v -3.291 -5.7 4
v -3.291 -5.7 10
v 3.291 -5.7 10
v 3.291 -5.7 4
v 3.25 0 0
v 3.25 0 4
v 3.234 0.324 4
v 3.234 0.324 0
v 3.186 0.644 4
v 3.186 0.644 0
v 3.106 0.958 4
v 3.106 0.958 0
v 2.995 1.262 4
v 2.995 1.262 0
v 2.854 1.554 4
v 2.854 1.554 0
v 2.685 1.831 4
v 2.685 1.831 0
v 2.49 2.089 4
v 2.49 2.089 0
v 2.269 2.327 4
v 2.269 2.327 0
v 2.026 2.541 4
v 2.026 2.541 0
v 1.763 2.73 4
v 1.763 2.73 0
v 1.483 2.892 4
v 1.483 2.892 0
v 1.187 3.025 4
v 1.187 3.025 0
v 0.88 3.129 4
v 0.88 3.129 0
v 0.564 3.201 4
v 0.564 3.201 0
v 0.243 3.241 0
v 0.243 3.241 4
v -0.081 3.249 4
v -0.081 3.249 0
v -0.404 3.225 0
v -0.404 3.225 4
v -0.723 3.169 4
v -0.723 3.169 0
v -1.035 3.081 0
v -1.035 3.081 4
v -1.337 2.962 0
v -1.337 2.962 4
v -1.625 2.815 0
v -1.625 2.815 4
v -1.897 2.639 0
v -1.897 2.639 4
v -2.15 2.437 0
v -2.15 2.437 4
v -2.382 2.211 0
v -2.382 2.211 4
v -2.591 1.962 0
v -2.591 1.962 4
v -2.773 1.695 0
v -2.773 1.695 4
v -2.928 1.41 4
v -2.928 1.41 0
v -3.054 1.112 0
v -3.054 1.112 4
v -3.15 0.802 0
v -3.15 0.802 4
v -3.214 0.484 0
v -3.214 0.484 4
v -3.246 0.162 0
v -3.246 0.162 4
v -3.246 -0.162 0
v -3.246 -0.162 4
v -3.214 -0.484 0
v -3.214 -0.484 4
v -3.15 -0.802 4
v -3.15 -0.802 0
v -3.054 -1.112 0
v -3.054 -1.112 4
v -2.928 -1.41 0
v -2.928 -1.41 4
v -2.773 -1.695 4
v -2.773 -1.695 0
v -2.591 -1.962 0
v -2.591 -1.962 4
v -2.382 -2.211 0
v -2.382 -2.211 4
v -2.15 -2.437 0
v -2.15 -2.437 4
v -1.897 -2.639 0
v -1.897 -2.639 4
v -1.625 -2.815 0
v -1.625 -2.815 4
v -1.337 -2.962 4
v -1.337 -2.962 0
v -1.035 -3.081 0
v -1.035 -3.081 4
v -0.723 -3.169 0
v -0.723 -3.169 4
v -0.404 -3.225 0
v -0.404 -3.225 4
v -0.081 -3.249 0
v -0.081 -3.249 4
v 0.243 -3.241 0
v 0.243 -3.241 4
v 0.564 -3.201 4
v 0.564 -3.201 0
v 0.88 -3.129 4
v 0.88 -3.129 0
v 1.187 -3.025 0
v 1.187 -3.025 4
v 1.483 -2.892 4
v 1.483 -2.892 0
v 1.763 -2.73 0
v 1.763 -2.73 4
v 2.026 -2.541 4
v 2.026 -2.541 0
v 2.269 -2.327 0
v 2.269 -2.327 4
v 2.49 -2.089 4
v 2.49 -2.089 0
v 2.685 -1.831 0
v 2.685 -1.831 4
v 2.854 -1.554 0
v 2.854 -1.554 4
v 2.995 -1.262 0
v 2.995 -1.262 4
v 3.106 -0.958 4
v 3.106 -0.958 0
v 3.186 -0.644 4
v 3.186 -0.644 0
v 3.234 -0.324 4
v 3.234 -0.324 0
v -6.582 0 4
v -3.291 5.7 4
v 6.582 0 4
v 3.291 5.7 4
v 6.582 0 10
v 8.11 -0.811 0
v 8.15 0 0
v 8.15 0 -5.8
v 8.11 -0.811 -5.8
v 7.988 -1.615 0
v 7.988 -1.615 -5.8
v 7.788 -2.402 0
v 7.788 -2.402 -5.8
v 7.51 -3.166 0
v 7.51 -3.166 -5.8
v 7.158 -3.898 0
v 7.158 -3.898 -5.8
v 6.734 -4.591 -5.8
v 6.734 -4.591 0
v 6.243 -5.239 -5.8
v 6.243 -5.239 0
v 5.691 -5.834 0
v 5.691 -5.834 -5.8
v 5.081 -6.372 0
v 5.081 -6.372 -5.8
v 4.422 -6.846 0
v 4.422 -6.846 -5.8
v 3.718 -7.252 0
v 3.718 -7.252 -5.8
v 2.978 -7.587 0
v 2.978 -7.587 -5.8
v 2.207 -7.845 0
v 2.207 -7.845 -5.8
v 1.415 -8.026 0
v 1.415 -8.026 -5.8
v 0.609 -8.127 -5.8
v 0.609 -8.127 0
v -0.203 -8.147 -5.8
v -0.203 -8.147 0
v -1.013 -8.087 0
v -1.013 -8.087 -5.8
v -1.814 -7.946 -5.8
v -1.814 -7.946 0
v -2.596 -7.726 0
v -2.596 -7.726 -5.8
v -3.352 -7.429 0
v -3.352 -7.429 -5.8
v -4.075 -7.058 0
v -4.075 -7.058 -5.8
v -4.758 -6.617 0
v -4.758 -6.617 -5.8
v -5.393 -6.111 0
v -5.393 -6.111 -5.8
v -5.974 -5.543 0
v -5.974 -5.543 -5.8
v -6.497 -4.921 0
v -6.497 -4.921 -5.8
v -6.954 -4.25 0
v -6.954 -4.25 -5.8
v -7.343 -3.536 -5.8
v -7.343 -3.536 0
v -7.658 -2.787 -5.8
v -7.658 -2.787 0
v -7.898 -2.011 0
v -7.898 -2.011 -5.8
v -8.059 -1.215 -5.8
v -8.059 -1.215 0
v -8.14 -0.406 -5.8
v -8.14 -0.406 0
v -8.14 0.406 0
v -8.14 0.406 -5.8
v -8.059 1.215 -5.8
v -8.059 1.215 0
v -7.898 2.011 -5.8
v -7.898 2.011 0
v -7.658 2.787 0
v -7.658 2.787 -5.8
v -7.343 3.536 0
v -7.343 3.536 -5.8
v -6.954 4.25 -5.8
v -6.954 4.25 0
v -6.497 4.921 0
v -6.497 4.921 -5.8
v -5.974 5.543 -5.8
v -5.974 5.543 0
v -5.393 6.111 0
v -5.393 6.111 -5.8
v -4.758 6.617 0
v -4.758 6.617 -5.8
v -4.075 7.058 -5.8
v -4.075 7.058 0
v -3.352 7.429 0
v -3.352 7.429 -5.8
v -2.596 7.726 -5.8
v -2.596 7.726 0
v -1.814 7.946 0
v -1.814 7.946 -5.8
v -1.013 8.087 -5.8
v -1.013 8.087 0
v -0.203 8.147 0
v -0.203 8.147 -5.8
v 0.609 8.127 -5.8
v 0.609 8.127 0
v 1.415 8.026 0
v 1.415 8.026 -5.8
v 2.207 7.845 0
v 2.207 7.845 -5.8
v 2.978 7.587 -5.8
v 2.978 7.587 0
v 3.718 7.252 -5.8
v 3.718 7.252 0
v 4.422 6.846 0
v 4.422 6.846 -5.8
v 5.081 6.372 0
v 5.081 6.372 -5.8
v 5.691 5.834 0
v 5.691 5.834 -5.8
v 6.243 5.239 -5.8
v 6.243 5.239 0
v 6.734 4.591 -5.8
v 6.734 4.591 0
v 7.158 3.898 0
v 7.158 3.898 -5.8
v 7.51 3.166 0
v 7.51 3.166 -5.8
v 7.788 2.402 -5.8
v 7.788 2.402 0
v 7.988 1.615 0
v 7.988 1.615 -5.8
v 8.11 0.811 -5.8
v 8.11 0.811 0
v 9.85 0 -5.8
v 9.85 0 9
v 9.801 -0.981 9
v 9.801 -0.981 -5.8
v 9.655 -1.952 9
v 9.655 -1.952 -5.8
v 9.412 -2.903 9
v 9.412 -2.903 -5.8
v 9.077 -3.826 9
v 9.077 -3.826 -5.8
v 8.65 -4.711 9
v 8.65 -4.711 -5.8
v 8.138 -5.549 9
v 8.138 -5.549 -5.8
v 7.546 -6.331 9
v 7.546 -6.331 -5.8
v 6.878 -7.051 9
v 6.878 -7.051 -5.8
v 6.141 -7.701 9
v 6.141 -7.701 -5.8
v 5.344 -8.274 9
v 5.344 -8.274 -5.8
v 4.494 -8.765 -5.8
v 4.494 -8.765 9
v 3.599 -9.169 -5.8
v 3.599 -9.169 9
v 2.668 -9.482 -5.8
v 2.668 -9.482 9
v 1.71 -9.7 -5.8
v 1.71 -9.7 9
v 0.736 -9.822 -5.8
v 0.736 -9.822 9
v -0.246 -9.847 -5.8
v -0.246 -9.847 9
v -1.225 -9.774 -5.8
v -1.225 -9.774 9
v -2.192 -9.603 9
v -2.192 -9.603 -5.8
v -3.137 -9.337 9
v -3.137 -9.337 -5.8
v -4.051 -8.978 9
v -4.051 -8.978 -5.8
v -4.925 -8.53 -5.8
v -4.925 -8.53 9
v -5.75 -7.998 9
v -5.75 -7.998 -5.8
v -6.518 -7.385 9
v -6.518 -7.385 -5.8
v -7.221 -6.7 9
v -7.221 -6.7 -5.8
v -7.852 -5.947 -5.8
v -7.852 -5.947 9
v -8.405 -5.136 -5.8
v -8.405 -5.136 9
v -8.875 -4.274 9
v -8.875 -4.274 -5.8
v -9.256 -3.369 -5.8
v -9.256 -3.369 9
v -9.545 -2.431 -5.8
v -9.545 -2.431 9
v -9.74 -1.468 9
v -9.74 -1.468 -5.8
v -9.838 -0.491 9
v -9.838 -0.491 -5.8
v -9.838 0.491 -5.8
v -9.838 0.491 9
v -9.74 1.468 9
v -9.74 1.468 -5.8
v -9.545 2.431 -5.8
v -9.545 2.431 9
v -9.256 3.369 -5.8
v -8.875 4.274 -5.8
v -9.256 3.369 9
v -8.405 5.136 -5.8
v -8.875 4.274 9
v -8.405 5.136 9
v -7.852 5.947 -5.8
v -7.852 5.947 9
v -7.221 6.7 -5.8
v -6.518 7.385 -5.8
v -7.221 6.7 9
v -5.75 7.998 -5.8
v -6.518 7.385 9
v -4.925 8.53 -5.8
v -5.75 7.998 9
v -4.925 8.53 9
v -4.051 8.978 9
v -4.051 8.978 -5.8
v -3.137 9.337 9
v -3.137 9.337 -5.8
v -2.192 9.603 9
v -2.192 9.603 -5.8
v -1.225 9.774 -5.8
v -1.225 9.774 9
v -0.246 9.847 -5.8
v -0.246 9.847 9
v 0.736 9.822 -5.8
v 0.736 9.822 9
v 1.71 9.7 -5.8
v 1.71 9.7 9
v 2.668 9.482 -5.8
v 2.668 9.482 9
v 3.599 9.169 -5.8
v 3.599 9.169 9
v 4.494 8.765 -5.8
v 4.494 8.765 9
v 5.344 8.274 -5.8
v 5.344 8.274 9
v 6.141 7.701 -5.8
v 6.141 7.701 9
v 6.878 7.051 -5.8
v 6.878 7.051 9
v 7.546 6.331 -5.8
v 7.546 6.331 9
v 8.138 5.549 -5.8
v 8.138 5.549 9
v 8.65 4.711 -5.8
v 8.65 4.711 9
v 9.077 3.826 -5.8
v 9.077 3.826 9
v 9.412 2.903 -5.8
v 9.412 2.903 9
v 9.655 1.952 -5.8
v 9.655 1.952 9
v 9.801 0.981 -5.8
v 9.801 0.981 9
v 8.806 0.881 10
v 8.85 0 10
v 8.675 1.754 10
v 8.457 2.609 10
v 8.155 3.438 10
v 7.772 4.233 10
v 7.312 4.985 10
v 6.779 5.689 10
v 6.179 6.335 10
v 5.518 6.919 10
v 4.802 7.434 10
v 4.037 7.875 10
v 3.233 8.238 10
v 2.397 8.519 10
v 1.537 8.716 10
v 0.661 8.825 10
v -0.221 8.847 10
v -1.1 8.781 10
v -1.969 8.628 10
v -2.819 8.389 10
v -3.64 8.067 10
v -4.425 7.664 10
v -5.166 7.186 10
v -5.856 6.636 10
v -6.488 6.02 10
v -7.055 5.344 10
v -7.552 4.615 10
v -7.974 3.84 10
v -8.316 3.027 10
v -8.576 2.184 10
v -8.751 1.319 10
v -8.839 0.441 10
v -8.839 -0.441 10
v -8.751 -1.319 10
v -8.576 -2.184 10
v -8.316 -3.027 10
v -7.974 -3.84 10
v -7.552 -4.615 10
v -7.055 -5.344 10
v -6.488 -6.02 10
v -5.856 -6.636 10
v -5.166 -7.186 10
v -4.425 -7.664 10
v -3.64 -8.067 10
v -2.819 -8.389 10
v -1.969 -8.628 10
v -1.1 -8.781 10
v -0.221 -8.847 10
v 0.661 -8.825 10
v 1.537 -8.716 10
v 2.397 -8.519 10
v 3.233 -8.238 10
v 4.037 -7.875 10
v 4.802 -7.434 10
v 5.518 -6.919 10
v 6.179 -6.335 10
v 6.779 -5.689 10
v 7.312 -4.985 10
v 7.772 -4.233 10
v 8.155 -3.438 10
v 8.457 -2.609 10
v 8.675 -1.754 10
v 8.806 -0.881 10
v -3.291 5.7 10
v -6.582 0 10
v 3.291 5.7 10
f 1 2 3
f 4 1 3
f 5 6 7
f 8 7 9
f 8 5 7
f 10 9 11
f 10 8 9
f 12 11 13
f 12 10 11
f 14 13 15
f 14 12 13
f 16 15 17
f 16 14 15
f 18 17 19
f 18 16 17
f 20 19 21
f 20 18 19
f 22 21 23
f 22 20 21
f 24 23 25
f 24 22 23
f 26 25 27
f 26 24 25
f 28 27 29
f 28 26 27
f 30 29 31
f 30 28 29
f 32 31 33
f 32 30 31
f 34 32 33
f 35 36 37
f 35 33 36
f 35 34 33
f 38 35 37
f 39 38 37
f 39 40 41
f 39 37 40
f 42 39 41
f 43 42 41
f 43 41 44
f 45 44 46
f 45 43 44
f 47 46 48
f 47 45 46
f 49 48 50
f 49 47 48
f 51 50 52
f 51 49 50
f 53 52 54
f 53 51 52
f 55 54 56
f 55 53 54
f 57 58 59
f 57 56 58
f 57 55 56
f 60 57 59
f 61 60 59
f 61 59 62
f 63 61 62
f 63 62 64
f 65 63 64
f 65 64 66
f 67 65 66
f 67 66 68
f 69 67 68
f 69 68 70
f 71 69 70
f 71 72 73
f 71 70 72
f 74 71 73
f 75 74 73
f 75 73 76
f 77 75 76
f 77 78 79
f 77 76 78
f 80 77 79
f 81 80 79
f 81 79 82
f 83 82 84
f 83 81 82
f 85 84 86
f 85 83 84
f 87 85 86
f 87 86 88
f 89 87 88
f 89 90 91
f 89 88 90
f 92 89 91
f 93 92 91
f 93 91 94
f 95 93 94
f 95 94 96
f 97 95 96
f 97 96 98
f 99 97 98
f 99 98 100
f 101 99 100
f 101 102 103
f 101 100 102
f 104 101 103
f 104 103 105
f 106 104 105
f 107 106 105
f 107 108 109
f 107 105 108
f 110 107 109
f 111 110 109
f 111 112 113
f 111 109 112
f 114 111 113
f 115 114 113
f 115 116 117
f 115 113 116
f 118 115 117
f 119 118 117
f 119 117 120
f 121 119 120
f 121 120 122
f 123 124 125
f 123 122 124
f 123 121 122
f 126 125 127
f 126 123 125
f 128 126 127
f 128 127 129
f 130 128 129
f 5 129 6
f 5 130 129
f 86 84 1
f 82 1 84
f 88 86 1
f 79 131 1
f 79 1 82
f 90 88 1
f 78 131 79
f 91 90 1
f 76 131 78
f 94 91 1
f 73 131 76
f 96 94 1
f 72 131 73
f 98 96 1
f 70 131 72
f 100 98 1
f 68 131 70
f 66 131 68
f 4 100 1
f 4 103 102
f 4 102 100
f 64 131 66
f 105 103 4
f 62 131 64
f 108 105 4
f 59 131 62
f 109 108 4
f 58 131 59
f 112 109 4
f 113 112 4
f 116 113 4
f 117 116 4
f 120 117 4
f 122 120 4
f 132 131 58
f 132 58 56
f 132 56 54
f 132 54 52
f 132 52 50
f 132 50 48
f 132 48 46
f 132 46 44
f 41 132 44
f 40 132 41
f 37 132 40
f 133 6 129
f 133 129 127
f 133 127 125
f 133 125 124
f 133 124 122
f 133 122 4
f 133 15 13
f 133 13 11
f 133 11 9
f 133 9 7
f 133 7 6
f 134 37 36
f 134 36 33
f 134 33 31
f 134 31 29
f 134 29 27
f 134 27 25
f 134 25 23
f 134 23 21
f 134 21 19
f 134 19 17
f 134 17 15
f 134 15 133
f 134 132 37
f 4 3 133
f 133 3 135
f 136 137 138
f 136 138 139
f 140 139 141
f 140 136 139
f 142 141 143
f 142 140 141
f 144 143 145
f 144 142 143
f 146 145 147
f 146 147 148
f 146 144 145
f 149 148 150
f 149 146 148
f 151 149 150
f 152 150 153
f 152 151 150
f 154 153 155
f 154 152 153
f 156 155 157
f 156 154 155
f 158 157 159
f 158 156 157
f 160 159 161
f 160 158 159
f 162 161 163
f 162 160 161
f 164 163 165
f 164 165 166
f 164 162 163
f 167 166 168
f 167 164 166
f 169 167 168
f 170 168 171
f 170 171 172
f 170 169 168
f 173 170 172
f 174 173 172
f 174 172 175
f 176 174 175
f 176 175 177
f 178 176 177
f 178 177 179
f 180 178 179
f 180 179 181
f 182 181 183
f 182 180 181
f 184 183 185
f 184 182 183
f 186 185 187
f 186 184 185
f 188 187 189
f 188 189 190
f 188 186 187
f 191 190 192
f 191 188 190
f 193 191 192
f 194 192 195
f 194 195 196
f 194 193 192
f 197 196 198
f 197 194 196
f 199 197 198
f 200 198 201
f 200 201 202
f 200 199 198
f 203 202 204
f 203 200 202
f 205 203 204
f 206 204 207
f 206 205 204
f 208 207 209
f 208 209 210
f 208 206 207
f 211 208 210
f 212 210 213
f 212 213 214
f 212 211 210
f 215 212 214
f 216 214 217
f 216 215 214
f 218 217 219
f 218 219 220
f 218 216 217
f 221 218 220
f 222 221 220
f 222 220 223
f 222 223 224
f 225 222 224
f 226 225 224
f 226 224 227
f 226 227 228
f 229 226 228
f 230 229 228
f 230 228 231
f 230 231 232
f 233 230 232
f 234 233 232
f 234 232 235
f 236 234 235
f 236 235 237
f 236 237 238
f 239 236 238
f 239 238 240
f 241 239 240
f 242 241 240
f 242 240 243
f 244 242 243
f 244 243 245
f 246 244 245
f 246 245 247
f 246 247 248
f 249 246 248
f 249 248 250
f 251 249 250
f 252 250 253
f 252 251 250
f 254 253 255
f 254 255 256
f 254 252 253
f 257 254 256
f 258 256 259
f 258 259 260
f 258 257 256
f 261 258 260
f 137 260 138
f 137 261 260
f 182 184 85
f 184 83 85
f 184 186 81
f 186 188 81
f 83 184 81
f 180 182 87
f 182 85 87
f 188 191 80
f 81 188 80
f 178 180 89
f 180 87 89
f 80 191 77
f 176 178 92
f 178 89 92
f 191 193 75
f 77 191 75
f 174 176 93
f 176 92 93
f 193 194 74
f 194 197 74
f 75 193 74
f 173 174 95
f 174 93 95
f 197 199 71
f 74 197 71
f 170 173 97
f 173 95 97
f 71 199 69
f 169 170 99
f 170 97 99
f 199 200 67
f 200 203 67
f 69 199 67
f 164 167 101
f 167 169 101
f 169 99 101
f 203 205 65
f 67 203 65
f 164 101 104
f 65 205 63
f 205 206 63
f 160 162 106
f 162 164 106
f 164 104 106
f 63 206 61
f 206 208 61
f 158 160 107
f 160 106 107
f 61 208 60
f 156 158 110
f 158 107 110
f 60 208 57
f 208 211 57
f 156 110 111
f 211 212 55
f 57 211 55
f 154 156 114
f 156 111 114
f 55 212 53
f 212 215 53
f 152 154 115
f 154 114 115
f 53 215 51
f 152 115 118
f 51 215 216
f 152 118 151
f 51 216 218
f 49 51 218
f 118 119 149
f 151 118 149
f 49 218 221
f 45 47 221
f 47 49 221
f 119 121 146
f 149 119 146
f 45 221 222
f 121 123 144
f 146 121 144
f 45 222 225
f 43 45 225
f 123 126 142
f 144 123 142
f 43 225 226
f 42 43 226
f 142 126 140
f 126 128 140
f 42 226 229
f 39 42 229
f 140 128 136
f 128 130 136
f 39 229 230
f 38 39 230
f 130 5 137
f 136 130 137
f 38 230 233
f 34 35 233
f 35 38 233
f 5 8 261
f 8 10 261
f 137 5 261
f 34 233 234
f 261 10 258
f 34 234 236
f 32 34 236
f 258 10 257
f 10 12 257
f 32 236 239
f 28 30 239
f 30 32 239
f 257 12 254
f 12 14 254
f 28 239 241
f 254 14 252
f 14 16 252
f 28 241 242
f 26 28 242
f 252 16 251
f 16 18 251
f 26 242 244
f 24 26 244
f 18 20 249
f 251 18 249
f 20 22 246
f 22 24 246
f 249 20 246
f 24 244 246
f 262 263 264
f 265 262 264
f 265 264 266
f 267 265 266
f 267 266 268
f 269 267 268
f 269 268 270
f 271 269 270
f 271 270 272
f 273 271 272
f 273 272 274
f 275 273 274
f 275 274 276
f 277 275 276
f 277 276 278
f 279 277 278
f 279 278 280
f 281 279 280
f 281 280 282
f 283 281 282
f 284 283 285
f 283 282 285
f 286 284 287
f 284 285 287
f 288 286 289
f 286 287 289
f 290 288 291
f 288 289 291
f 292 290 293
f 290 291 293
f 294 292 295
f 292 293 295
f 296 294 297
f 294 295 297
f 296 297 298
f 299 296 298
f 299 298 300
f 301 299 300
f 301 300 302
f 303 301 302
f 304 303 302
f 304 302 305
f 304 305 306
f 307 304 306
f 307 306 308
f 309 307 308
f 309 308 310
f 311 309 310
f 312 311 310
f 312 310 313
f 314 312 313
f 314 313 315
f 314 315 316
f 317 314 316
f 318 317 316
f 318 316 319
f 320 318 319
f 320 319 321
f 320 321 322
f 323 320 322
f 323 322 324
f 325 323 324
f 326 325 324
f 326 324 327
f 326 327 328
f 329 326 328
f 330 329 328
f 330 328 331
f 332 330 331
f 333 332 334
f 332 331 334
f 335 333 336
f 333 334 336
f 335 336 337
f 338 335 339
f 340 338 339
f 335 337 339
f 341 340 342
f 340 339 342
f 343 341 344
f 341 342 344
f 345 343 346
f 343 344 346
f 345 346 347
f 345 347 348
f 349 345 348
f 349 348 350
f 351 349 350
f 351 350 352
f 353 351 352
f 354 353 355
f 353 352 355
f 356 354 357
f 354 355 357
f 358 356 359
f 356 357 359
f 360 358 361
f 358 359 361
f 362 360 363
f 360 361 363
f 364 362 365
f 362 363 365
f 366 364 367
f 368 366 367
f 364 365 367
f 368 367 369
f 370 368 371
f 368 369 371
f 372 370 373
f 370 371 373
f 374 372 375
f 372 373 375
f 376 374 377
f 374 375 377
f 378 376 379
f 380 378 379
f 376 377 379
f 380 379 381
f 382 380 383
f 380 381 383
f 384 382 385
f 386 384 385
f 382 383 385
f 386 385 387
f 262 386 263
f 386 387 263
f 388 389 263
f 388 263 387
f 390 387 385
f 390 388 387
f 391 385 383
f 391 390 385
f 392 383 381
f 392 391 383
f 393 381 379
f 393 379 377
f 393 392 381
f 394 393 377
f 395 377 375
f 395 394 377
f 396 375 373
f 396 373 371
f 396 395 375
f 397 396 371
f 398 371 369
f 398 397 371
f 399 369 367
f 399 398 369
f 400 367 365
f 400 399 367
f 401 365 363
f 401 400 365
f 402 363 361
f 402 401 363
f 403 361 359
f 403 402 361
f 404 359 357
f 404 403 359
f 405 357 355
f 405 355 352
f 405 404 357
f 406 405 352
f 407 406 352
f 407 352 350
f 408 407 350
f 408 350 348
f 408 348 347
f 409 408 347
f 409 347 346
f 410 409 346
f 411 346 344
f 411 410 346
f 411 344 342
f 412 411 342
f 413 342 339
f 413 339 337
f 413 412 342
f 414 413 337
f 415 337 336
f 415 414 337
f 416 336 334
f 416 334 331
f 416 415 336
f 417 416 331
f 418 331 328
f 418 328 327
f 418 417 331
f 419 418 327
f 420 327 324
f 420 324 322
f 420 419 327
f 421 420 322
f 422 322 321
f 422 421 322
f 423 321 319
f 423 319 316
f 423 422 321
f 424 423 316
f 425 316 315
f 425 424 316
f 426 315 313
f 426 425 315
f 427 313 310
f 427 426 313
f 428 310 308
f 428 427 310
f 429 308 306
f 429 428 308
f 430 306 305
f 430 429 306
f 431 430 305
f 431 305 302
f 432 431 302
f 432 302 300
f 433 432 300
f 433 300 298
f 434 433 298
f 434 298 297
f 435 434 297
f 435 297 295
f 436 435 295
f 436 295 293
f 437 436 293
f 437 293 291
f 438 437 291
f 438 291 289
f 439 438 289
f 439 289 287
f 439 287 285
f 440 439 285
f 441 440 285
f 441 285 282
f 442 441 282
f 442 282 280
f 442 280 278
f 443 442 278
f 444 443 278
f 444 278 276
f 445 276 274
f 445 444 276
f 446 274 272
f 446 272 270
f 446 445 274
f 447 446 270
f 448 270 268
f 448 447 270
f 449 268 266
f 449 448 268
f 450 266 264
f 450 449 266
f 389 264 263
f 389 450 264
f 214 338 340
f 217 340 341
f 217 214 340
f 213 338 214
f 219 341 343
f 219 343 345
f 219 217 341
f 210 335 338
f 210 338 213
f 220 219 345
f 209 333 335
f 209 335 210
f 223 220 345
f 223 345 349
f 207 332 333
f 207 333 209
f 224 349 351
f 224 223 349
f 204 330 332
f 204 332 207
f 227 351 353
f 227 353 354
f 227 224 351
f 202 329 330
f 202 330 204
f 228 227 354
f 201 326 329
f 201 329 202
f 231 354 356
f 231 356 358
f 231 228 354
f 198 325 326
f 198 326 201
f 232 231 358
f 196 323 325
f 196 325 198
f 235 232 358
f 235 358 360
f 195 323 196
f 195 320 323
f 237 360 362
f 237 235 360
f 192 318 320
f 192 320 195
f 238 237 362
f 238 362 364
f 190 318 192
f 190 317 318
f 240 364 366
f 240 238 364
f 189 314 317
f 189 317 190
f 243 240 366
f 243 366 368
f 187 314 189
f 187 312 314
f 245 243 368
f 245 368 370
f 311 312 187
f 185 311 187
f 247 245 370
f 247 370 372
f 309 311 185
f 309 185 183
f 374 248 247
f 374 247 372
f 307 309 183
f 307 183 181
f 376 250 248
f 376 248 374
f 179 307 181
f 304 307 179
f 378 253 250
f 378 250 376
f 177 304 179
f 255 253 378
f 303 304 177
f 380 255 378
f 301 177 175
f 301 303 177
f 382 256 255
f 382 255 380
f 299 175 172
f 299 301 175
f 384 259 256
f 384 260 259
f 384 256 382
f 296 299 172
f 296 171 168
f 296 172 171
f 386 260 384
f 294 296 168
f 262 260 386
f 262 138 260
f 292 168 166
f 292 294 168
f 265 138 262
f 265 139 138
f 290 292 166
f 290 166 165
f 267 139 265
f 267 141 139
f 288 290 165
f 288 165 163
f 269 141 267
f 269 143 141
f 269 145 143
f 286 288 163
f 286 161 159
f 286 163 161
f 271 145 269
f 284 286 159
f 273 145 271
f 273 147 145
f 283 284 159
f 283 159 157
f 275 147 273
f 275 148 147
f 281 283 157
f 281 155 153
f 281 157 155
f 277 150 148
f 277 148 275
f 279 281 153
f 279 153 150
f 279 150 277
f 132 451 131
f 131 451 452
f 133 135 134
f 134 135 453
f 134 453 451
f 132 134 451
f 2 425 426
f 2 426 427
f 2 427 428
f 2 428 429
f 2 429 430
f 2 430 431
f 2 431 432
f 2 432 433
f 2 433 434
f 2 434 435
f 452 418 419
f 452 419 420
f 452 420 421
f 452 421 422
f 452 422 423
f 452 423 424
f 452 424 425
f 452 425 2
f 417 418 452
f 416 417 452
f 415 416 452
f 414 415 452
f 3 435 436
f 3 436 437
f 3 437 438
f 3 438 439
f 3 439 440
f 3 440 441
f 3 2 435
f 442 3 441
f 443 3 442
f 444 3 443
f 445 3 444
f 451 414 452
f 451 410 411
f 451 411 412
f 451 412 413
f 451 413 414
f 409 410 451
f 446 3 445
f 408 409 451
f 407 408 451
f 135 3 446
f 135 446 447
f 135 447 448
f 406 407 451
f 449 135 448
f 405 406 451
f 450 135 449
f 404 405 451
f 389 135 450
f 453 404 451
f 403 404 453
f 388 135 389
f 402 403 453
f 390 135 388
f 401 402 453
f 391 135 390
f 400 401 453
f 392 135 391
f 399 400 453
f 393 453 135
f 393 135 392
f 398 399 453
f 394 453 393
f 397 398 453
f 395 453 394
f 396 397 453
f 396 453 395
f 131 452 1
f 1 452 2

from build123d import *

# Parameters (mm, degrees)
SKETCH_R      = 9.85
SKETCH_R_2    = 3.25
PAD_DEPTH     = 10
SKETCH001_R   = 9.85
SKETCH001_R_2 = 8.15
PAD001_DEPTH  = 5.8
POCKET_DEPTH  = 6
CHAMFER_SIZE  = 1


with BuildPart() as part:
    # Sketch → Pad (new body)
    with BuildSketch(Plane.XY):
        Circle(SKETCH_R)
        Circle(SKETCH_R_2, mode=Mode.SUBTRACT)
    extrude(amount=PAD_DEPTH)

    # Sketch001 (on Face3 of Pad) → Pad001 (join)
    with BuildSketch(Plane(origin=(0, 0, 0), x_dir=(1, 0, 0), z_dir=(0, 0, -1))):
        Circle(SKETCH001_R)
        Circle(SKETCH001_R_2, mode=Mode.SUBTRACT)
    extrude(amount=PAD001_DEPTH)

    # Sketch002 (on Face3 of Pad001) → Pocket (cut)
    with BuildSketch(Plane.XY.offset(10)):
        Polygon((6.581793, 0), (3.290897, 5.7), (-3.290897, 5.7), (-6.581793, 0), (-3.290897, -5.7), (3.290897, -5.7), align=None)
    extrude(amount=-POCKET_DEPTH, mode=Mode.SUBTRACT)

    # Chamfer
    chamfer_edges = [part.edges().sort_by_distance(p)[0] for p in [
        (-9.85, 0, 10),
    ]]
    chamfer(chamfer_edges, length=CHAMFER_SIZE)


solid = part.part
